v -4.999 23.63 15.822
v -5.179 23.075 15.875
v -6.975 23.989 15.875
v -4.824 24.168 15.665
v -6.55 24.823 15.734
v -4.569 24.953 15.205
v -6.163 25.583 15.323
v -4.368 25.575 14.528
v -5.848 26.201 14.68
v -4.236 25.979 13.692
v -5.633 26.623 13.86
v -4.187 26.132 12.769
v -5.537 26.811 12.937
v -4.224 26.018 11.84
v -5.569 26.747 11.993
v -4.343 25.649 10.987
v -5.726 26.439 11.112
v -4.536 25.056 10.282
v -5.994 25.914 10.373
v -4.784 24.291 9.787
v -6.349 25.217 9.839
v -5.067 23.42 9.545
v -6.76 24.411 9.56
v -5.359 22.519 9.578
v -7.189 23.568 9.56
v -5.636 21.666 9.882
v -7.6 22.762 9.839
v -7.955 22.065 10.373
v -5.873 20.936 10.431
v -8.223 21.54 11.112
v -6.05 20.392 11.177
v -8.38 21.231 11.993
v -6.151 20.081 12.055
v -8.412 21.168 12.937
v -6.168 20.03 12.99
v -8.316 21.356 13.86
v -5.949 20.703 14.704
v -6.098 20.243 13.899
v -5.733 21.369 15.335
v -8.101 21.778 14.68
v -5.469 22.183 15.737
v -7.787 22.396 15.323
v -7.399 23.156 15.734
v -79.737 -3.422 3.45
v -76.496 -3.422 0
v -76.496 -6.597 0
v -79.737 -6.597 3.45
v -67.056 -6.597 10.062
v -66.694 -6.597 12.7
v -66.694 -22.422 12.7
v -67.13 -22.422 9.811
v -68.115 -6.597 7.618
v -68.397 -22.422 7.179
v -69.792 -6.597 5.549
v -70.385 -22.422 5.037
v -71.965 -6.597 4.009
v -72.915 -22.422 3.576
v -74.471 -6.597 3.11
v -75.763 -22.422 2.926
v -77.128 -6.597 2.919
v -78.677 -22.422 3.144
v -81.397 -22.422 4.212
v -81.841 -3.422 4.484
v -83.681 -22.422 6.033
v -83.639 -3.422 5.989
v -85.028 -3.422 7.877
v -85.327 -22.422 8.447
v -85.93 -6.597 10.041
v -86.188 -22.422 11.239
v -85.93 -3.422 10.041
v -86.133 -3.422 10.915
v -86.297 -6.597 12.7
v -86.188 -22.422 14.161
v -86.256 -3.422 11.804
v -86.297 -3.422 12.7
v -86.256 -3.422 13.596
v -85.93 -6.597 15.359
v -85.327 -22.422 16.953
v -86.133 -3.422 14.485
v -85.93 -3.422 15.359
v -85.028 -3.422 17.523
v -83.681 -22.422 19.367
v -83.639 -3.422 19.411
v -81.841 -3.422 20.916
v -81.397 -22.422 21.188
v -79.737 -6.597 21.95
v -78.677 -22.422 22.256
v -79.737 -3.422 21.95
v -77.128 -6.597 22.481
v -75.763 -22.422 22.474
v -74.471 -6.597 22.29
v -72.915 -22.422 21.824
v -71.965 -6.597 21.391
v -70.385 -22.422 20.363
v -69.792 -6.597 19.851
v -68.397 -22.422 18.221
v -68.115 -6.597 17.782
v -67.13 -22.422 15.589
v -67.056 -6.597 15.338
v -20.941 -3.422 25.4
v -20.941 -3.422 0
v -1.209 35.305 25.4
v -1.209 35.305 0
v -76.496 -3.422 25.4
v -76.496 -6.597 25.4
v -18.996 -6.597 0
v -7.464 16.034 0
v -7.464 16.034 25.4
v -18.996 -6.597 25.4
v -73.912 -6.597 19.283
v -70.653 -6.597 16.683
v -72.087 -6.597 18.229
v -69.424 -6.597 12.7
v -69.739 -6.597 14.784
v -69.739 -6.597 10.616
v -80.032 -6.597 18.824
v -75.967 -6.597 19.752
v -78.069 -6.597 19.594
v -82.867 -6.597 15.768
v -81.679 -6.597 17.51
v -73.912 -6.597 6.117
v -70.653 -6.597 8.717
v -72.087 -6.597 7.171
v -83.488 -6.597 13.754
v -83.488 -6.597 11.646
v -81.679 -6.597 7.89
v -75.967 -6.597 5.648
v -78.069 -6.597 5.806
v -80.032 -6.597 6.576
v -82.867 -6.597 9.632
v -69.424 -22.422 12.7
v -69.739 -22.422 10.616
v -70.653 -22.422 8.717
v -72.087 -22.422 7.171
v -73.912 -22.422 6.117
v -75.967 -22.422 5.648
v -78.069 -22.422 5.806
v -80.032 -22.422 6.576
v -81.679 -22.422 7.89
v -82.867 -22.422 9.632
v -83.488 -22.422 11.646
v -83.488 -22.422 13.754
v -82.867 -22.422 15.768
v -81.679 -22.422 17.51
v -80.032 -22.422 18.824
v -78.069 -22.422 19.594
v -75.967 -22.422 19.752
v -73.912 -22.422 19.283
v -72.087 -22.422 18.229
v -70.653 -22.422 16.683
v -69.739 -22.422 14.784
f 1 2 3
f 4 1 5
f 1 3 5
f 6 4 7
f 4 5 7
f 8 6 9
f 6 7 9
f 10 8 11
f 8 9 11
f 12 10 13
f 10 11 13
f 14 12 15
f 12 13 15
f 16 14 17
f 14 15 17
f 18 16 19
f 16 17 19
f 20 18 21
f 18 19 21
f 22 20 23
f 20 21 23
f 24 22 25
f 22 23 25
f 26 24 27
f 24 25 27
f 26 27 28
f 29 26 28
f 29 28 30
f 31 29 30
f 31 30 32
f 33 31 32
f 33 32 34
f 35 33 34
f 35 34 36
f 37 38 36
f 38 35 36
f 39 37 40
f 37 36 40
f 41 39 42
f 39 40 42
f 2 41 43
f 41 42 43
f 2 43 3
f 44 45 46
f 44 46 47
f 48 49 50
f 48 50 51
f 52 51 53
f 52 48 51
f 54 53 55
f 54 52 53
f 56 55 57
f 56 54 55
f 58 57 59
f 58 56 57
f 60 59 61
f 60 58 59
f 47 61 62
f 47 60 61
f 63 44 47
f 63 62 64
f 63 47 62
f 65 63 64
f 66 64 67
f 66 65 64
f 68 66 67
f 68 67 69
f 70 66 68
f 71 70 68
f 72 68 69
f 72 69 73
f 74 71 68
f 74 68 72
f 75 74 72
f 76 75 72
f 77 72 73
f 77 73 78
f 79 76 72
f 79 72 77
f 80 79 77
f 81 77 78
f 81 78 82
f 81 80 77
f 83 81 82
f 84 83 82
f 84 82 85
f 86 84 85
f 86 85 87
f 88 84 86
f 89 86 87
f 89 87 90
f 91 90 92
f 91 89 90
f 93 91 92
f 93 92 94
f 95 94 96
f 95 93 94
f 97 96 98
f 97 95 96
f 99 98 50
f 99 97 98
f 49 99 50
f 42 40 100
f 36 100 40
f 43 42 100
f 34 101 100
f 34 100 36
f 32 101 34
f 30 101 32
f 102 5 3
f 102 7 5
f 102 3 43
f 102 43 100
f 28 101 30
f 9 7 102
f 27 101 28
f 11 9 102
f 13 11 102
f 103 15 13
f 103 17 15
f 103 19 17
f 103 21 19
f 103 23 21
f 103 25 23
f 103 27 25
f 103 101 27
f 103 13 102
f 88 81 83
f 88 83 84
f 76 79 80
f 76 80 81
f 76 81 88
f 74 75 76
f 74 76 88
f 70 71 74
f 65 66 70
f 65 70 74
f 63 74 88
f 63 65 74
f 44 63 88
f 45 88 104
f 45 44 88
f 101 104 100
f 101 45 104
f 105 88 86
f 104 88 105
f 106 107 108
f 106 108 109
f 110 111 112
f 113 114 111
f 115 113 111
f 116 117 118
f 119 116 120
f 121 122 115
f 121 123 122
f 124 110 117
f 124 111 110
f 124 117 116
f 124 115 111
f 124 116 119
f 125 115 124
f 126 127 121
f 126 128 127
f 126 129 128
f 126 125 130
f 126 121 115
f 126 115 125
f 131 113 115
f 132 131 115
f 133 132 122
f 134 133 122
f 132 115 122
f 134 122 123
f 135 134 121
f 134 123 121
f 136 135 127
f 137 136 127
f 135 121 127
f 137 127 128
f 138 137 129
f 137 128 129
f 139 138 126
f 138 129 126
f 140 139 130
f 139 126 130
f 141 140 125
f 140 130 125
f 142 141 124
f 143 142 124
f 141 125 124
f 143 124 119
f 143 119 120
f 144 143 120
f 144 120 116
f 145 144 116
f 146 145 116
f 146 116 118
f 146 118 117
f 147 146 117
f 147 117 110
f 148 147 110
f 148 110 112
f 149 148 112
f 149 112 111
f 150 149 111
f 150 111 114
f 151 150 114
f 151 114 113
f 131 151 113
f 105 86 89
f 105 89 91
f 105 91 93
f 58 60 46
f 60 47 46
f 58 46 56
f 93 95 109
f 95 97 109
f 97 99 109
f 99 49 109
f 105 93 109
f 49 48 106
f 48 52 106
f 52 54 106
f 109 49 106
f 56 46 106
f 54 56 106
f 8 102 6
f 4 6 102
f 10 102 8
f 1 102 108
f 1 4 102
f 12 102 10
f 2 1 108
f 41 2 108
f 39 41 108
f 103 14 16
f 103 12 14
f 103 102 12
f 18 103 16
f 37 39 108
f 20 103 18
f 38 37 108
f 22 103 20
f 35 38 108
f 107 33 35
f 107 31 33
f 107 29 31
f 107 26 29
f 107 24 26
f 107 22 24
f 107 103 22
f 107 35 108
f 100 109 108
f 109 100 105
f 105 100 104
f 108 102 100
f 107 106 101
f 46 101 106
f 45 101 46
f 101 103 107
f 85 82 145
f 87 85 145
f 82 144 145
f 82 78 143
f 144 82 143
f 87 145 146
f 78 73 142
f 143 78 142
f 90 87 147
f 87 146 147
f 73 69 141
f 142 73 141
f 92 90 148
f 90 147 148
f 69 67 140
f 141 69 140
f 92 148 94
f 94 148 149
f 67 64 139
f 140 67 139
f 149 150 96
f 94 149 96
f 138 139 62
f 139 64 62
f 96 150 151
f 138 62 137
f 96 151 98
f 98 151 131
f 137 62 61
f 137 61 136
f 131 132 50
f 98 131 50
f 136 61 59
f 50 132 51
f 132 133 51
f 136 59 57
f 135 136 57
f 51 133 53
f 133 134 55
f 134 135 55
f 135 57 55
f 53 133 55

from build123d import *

# Parameters (mm, degrees)
BOSS_EXTRUDE1_DEPTH = 25.4
SKETCH2_R           = 9.801448676
SKETCH2_R_2         = 7.071368029
BOSS_EXTRUDE2_DEPTH = 19
BOSS_EXTRUDE3_DEPTH = 3.175
SKETCH4_R           = 3.175
CUT_EXTRUDE1_DEPTH  = 3.175


with BuildPart() as part:
    # Sketch1 → Boss-Extrude1 (new body)
    with BuildSketch(Plane.XY):
        Polygon((-76.495819173, -3.422180745), (-20.941461675, -3.422180745), (-1.20885062, 35.305249012), (-7.464460479, 16.03438497), (-18.995819173, -6.597180745), (-76.495819173, -6.597180745), align=None)
    extrude(amount=BOSS_EXTRUDE1_DEPTH)

    # Sketch2 → Boss-Extrude2 (add)
    with BuildSketch(Plane(origin=(0, -3.422180745, 0), x_dir=(1, 0, 0), z_dir=(0, 1, 0))):
        with Locations((-76.495819173, -12.7)):
            Circle(SKETCH2_R)
        with Locations((-76.495819173, -12.7)):
            Circle(SKETCH2_R_2, mode=Mode.SUBTRACT)
    extrude(amount=-BOSS_EXTRUDE2_DEPTH)

    # Sketch3 → Boss-Extrude3 (add)
    with BuildSketch(Plane(origin=(0, -3.422180745, 0), x_dir=(1, 0, 0), z_dir=(0, 1, 0))):
        Polygon((-76.495819173, -25.4), (-76.495819173, 0), (-85.929582176, -10.040580563), (-85.929582176, -15.359419437), align=None)
        Polygon((-85.929582176, -15.359419437), (-85.929582176, -10.040580563), (-86.297267848, -12.7), align=None)
    extrude(amount=-BOSS_EXTRUDE3_DEPTH)

    # Sketch4 → Cut-Extrude1 (cut)
    with BuildSketch(Plane(origin=(-15.240970814, 7.765662505, 0), x_dir=(0, 0, 1), z_dir=(-0.891006524, 0.4539905, 0))):
        with Locations((12.7, 18.20840051)):
            Circle(SKETCH4_R)
    extrude(amount=-CUT_EXTRUDE1_DEPTH, mode=Mode.SUBTRACT)


solid = part.part
